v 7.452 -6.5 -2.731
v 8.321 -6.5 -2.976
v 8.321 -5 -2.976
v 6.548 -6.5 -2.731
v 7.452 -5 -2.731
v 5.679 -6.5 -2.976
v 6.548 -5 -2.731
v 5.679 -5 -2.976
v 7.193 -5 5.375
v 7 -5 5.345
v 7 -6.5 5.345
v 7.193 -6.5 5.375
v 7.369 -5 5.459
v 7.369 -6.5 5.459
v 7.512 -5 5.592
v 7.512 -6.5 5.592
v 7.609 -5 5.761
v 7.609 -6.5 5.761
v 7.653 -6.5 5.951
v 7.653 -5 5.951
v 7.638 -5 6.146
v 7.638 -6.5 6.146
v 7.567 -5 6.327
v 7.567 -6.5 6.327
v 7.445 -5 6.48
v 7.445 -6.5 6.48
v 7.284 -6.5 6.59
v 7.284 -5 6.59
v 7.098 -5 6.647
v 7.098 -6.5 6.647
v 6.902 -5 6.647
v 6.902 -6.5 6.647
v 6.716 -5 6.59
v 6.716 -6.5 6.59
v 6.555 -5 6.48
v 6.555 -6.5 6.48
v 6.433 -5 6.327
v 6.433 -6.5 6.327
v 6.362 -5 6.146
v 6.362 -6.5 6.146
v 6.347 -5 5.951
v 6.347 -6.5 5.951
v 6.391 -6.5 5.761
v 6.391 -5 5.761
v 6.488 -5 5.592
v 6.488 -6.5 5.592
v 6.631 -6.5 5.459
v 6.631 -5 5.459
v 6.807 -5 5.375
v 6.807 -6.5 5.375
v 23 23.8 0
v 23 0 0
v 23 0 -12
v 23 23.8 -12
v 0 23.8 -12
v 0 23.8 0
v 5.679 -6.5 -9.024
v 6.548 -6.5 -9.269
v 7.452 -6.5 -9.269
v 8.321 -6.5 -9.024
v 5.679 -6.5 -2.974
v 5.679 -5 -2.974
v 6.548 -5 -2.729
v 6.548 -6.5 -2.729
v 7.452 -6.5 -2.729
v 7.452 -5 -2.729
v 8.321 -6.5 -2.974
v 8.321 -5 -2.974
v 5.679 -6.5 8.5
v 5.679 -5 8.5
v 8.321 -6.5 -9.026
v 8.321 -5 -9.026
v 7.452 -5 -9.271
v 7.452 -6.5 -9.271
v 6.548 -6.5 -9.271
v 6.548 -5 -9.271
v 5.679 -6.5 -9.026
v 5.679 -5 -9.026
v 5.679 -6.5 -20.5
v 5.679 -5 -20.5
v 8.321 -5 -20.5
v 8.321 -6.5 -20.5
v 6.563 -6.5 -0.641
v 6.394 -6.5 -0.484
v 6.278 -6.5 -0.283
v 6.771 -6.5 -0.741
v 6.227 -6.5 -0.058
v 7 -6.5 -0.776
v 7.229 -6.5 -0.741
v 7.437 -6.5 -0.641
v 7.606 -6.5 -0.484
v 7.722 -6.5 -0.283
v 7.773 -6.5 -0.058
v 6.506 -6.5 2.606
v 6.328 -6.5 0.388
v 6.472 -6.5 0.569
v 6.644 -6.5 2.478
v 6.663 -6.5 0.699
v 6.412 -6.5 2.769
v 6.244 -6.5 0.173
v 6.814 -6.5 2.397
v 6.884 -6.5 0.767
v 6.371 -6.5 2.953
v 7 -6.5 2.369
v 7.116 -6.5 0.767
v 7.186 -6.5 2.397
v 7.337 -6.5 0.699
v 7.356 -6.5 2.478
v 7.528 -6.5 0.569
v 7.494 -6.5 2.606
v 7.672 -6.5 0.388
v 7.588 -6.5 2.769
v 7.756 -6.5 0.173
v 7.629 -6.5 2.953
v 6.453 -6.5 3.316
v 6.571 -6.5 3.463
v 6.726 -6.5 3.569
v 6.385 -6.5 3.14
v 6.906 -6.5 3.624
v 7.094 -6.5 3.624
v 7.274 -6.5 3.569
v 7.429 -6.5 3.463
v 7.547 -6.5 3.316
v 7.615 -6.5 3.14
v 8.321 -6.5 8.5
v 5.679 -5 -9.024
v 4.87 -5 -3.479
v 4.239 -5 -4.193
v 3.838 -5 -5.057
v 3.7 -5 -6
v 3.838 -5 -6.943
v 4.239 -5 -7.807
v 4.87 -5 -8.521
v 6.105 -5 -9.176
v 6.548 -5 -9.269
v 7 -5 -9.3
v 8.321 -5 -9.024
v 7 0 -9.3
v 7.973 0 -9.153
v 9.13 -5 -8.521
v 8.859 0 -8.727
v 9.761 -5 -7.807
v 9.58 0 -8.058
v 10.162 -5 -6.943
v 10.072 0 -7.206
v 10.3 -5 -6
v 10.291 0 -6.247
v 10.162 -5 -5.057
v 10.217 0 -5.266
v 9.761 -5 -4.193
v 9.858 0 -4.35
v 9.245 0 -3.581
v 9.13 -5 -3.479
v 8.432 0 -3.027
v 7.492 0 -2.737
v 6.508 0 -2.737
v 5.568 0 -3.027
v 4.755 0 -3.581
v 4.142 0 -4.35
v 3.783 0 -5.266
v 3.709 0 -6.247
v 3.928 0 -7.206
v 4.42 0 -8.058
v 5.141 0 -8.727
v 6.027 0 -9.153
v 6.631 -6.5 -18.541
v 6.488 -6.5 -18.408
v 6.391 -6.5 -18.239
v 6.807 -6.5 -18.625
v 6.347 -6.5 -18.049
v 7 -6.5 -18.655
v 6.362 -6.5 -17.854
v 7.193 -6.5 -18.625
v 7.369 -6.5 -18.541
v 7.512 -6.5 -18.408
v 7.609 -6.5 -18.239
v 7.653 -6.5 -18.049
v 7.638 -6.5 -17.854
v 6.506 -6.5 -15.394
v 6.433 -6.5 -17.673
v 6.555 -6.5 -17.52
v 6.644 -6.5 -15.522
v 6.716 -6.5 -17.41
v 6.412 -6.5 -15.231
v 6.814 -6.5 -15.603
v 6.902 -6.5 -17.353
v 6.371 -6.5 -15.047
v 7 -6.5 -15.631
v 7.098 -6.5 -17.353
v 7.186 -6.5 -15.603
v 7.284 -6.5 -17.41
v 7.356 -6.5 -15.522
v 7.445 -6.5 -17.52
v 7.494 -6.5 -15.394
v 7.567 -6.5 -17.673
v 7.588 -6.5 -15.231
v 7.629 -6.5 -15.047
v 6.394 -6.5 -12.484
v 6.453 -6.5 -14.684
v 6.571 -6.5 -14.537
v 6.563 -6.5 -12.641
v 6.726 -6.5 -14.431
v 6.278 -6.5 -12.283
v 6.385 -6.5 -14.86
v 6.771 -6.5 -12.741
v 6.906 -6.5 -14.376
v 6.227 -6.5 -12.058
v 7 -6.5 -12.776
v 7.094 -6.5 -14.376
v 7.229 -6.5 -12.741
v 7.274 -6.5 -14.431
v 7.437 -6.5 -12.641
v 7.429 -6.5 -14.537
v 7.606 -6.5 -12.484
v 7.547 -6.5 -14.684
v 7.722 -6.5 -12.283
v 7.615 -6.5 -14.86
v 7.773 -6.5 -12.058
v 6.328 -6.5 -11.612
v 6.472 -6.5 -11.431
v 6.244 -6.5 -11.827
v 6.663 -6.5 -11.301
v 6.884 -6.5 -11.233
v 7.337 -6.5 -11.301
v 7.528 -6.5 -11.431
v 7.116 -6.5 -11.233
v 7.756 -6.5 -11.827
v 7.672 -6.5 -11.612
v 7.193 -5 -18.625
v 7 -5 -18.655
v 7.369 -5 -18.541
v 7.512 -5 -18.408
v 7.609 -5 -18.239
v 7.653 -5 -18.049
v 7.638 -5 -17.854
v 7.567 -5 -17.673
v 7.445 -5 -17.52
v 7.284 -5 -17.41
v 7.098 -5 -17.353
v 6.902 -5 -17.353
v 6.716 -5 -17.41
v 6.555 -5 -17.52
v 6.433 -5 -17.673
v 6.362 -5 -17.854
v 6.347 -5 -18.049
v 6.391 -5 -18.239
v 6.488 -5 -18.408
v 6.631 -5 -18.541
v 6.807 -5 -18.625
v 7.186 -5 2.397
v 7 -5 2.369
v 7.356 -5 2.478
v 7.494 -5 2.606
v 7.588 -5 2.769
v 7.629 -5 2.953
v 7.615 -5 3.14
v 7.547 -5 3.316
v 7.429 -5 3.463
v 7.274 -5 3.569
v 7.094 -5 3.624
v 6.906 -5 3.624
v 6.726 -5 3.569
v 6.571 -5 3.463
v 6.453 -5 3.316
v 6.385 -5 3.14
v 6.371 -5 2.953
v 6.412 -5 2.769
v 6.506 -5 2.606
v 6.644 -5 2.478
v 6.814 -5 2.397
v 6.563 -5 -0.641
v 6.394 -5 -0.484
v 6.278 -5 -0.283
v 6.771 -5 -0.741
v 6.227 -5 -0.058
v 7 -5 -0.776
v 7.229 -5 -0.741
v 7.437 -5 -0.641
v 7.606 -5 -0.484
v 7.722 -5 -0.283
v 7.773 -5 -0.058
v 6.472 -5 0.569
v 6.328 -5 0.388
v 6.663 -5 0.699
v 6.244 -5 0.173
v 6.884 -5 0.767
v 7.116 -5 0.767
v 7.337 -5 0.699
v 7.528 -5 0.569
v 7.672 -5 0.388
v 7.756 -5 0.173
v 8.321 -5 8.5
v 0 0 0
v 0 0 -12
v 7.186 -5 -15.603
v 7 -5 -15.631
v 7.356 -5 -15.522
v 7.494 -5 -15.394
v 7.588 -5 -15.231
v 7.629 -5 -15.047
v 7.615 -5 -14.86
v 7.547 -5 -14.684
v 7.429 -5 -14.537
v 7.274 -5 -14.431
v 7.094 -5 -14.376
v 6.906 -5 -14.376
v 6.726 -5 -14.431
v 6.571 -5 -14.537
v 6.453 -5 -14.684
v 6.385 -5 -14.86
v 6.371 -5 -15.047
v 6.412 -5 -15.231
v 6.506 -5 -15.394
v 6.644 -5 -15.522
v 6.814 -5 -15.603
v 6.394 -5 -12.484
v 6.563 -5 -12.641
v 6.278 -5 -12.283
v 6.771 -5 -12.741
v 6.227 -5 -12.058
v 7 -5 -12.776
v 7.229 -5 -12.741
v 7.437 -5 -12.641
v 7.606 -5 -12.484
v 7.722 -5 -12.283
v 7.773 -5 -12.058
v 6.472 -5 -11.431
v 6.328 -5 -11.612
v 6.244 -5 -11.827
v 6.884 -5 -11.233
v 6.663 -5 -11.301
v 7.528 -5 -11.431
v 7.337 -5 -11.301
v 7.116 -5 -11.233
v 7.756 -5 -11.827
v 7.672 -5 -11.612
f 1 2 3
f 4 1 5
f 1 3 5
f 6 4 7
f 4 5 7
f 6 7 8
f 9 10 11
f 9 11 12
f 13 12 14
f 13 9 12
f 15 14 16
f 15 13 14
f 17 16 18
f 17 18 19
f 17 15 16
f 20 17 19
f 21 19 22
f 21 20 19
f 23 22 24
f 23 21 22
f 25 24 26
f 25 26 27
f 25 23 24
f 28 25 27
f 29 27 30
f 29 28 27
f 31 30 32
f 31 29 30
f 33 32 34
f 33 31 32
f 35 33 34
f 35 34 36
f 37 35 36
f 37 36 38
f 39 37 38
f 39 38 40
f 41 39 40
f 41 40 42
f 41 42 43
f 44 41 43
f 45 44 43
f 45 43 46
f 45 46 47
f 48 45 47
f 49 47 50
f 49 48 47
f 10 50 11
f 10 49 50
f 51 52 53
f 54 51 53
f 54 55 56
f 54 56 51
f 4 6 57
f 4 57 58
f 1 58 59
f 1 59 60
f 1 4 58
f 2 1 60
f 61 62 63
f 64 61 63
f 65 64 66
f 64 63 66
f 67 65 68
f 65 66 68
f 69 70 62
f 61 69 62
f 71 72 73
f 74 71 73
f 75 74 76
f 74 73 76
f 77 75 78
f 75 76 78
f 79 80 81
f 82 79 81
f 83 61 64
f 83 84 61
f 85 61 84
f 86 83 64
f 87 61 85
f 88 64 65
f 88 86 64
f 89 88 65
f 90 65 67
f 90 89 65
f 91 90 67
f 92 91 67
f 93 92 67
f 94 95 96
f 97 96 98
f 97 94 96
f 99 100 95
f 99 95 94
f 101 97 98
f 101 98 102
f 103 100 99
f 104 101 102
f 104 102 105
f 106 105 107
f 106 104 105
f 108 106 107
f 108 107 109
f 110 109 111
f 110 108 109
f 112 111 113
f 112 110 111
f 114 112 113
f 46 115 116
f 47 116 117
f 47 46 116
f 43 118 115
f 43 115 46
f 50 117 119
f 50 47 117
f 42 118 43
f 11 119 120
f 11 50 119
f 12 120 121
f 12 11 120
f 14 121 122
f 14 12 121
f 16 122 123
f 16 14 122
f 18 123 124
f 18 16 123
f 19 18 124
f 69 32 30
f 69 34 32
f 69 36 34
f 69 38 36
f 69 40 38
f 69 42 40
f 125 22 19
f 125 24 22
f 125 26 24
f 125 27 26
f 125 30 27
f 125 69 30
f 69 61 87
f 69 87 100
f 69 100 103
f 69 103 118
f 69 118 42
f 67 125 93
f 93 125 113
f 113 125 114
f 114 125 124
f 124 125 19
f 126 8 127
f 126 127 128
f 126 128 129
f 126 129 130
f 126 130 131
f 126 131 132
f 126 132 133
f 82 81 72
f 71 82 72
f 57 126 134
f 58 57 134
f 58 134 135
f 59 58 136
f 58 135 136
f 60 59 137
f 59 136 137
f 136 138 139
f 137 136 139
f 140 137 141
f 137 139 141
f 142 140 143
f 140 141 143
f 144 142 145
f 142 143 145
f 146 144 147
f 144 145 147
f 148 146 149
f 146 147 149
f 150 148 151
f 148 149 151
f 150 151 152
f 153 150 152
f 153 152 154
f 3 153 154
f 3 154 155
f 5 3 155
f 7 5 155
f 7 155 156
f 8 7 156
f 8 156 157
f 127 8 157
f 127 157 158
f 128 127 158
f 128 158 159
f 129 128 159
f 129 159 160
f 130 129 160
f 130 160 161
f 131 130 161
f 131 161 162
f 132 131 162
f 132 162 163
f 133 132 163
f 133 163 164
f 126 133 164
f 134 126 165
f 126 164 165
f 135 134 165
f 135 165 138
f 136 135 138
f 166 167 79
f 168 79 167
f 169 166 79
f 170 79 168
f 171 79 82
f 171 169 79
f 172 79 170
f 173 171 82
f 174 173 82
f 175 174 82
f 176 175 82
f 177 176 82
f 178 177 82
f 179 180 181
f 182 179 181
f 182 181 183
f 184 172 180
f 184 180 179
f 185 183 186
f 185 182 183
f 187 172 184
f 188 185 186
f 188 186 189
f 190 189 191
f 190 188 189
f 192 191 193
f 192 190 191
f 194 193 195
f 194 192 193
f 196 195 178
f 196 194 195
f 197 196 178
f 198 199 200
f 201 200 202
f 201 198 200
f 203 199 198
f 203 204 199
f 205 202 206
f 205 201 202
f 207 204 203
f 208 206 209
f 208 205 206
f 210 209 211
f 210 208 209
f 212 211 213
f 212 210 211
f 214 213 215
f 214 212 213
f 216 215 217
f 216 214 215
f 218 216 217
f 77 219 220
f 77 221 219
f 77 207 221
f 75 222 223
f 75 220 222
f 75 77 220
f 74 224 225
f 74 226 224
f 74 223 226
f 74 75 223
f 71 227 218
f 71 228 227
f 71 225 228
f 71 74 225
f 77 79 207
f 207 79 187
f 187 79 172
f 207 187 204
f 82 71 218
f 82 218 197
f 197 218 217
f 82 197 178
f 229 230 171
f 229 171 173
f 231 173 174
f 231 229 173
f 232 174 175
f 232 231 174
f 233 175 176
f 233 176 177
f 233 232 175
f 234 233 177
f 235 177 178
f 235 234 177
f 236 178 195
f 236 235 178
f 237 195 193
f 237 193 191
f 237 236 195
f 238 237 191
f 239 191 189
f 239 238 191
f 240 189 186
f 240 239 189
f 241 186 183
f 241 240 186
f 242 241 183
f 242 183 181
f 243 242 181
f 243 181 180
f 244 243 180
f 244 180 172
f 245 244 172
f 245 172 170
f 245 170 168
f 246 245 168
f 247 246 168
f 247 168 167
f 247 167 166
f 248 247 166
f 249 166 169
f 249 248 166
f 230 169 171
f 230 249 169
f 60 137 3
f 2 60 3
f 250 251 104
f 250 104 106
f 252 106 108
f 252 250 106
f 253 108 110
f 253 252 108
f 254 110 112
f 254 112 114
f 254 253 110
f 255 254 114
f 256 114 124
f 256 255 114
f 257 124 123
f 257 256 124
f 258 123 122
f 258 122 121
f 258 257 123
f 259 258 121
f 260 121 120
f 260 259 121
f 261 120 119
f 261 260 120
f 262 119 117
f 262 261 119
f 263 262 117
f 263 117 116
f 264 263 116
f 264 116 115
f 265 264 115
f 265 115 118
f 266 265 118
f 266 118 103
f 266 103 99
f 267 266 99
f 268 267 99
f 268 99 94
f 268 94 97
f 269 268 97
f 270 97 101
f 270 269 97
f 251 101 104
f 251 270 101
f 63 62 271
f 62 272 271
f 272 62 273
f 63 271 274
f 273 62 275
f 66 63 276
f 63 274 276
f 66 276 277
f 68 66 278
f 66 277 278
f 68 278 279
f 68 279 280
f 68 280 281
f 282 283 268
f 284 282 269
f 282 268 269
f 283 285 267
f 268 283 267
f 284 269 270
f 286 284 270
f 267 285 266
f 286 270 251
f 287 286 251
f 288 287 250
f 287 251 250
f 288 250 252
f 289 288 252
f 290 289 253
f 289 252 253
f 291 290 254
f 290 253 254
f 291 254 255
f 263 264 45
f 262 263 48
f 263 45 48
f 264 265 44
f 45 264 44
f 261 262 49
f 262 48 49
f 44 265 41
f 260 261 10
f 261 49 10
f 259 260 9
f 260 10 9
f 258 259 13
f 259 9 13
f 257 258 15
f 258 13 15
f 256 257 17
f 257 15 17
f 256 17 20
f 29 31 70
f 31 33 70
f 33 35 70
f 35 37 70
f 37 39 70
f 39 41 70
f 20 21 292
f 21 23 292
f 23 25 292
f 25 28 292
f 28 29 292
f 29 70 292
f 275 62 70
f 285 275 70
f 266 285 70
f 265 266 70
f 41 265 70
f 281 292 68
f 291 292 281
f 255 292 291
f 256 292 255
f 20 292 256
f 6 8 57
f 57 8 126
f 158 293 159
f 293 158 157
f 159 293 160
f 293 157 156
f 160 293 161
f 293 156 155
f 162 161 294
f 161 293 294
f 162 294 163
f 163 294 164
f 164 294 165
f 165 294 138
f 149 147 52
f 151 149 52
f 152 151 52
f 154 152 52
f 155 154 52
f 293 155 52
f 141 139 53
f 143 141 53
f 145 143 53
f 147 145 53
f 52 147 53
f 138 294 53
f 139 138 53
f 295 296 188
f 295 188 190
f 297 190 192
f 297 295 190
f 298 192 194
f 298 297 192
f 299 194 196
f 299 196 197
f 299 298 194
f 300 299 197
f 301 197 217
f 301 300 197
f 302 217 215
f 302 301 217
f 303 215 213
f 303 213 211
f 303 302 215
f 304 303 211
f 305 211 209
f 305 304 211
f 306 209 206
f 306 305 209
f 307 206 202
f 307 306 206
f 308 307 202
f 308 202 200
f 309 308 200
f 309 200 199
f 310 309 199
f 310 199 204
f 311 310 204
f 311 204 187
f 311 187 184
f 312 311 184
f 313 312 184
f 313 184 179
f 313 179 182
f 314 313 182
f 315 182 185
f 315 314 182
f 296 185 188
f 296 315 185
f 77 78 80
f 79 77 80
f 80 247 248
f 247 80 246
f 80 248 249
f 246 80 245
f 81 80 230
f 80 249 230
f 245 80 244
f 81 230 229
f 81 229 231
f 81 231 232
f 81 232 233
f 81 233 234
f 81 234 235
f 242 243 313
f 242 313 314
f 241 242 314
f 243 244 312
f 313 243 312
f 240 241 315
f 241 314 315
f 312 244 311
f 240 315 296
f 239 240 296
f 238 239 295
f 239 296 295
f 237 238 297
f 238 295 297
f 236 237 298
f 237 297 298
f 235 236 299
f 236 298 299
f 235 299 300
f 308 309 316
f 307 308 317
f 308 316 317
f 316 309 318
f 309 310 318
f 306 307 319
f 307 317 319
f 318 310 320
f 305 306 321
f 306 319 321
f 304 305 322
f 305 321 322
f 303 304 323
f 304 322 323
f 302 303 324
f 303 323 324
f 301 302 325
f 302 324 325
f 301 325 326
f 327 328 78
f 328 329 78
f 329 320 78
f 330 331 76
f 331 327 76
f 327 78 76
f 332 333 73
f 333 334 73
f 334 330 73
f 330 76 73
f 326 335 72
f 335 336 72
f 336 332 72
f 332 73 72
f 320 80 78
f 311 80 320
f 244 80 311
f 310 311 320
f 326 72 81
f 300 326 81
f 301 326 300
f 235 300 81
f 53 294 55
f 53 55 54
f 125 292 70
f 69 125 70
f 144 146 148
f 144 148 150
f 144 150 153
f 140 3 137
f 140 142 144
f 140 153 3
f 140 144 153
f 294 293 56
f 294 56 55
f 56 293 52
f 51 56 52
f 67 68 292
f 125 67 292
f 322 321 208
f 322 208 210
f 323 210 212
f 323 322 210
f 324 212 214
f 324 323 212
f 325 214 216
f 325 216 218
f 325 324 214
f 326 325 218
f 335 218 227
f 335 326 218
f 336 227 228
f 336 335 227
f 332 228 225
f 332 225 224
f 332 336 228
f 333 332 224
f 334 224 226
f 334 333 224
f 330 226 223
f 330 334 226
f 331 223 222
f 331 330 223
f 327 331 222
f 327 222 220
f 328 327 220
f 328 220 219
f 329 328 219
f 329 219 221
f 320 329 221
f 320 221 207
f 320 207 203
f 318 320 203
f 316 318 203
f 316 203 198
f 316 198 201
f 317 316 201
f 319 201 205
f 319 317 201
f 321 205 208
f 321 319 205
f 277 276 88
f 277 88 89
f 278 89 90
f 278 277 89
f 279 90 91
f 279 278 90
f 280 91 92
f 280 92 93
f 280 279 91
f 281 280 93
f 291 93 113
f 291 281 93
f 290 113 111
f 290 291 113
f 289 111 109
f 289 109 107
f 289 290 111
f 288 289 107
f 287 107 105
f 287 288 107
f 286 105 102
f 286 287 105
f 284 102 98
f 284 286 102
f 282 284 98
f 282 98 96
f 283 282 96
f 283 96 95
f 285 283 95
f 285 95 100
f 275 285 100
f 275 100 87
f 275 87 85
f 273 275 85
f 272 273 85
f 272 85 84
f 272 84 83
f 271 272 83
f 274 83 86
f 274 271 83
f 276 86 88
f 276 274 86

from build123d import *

# Parameters (mm, degrees)
SKETCH1_W           = 23
SKETCH1_H           = 12
BOSS_EXTRUDE1_DEPTH = 23.8
SKETCH2_R           = 3.3
BOSS_EXTRUDE2_DEPTH = 5
SKETCH3_R           = 0.7756072
SKETCH3_R_2         = 0.6312306
SKETCH3_R_3         = 0.654535051
BOSS_EXTRUDE3_DEPTH = 1.5


with BuildPart() as part:
    # Sketch1 → Boss-Extrude1 (new body)
    with BuildSketch(Plane(origin=(0, 0, 0), x_dir=(1, 0, 0), z_dir=(0, 1, 0))):
        with Locations((11.5, 6)):
            Rectangle(SKETCH1_W, SKETCH1_H)
    extrude(amount=BOSS_EXTRUDE1_DEPTH)

    # Sketch2 → Boss-Extrude2 (add)
    with BuildSketch(Plane.XZ):
        with Locations(Location((7, -6, 0), (0, 0, 270))):
            Circle(SKETCH2_R)
    extrude(amount=BOSS_EXTRUDE2_DEPTH)

    # Sketch3 → Boss-Extrude3 (add)
    # profile 1 of 6: a face of its own
    with BuildSketch(Plane.XZ.offset(5)):
        with BuildLine():
            Line((5.679025589, 8.5), (5.679025589, -2.973967359))
            ThreePointArc((5.679025589, -2.973967359), (7, -2.698205497), (8.320974411, -2.973967359))
            Line((8.320974411, -2.973967359), (8.320974411, 8.5))
            Line((8.320974411, 8.5), (5.679025589, 8.5))
        make_face()
        with Locations(Location((7, 0, 0), (0, 0, 270))):
            Circle(SKETCH3_R, mode=Mode.SUBTRACT)
        with Locations(Location((7, 3, 0), (0, 0, 270))):
            Circle(SKETCH3_R_2, mode=Mode.SUBTRACT)
        with Locations(Location((7, 6, 0), (0, 0, 270))):
            Circle(SKETCH3_R_3, mode=Mode.SUBTRACT)
    # profile 2 of 6: a face of its own
    with BuildSketch(Plane.XZ.offset(5)):
        with BuildLine():
            Line((5.679025589, -2.975925496), (5.679025589, -6))
            Line((5.679025589, -6), (8.320974411, -6))
            Line((8.320974411, -6), (8.320974411, -2.975925496))
            ThreePointArc((8.320974411, -2.975925496), (7, -2.7), (5.679025589, -2.975925496))
        make_face()
    # profile 3 of 6: a face of its own
    with BuildSketch(Plane.XZ.offset(5)):
        with BuildLine():
            Line((8.320974411, -6), (5.679025589, -6))
            Line((5.679025589, -6), (5.679025589, -9.024074504))
            ThreePointArc((5.679025589, -9.024074504), (7, -9.3), (8.320974411, -9.024074504))
            Line((8.320974411, -9.024074504), (8.320974411, -6))
        make_face()
    # profile 4 of 6: a face of its own
    with BuildSketch(Plane.XZ.offset(5)):
        with BuildLine():
            Line((5.679025589, -2.975925496), (5.679025589, -6))
            Line((5.679025589, -6), (8.320974411, -6))
            Line((8.320974411, -6), (8.320974411, -2.975925496))
            ThreePointArc((8.320974411, -2.975925496), (7, -2.7), (5.679025589, -2.975925496))
        make_face()
    # profile 5 of 6: a face of its own
    with BuildSketch(Plane.XZ.offset(5)):
        with BuildLine():
            Line((8.320974411, -6), (5.679025589, -6))
            Line((5.679025589, -6), (5.679025589, -9.024074504))
            ThreePointArc((5.679025589, -9.024074504), (7, -9.3), (8.320974411, -9.024074504))
            Line((8.320974411, -9.024074504), (8.320974411, -6))
        make_face()
    # profile 6 of 6: a face of its own
    with BuildSketch(Plane.XZ.offset(5)):
        with BuildLine():
            ThreePointArc((8.320974411, -9.026032641), (7, -9.301794503), (5.679025589, -9.026032641))
            Line((5.679025589, -9.026032641), (5.679025589, -20.5))
            Line((5.679025589, -20.5), (8.320974411, -20.5))
            Line((8.320974411, -20.5), (8.320974411, -9.026032641))
        make_face()
        with Locations(Location((7, -18, 0), (0, 0, 270))):
            Circle(SKETCH3_R_3, mode=Mode.SUBTRACT)
        with Locations(Location((7, -15, 0), (0, 0, 270))):
            Circle(SKETCH3_R_2, mode=Mode.SUBTRACT)
        with Locations(Location((7, -12, 0), (0, 0, 270))):
            Circle(SKETCH3_R, mode=Mode.SUBTRACT)
    extrude(amount=BOSS_EXTRUDE3_DEPTH)


with BuildPart() as boss_extrude3_piece_1:
    # of the separate pieces the step leaves, piece 1, a body of its own (boss_extrude3_pieces)
    add(part.part.solids().sort_by_distance((0, 0, 0))[0])


with BuildPart() as boss_extrude3_piece_2:
    # of the separate pieces the step leaves, piece 2, a body of its own (boss_extrude3_pieces)
    add(part.part.solids().sort_by_distance((5.679025589, -5, -2.973967359))[0])


with BuildPart() as boss_extrude3_piece_3:
    # of the separate pieces the step leaves, piece 3, a body of its own (boss_extrude3_pieces)
    add(part.part.solids().sort_by_distance((8.320974411, -5, -9.026032641))[0])


solid = Compound([boss_extrude3_piece_1.part, boss_extrude3_piece_2.part, boss_extrude3_piece_3.part])
